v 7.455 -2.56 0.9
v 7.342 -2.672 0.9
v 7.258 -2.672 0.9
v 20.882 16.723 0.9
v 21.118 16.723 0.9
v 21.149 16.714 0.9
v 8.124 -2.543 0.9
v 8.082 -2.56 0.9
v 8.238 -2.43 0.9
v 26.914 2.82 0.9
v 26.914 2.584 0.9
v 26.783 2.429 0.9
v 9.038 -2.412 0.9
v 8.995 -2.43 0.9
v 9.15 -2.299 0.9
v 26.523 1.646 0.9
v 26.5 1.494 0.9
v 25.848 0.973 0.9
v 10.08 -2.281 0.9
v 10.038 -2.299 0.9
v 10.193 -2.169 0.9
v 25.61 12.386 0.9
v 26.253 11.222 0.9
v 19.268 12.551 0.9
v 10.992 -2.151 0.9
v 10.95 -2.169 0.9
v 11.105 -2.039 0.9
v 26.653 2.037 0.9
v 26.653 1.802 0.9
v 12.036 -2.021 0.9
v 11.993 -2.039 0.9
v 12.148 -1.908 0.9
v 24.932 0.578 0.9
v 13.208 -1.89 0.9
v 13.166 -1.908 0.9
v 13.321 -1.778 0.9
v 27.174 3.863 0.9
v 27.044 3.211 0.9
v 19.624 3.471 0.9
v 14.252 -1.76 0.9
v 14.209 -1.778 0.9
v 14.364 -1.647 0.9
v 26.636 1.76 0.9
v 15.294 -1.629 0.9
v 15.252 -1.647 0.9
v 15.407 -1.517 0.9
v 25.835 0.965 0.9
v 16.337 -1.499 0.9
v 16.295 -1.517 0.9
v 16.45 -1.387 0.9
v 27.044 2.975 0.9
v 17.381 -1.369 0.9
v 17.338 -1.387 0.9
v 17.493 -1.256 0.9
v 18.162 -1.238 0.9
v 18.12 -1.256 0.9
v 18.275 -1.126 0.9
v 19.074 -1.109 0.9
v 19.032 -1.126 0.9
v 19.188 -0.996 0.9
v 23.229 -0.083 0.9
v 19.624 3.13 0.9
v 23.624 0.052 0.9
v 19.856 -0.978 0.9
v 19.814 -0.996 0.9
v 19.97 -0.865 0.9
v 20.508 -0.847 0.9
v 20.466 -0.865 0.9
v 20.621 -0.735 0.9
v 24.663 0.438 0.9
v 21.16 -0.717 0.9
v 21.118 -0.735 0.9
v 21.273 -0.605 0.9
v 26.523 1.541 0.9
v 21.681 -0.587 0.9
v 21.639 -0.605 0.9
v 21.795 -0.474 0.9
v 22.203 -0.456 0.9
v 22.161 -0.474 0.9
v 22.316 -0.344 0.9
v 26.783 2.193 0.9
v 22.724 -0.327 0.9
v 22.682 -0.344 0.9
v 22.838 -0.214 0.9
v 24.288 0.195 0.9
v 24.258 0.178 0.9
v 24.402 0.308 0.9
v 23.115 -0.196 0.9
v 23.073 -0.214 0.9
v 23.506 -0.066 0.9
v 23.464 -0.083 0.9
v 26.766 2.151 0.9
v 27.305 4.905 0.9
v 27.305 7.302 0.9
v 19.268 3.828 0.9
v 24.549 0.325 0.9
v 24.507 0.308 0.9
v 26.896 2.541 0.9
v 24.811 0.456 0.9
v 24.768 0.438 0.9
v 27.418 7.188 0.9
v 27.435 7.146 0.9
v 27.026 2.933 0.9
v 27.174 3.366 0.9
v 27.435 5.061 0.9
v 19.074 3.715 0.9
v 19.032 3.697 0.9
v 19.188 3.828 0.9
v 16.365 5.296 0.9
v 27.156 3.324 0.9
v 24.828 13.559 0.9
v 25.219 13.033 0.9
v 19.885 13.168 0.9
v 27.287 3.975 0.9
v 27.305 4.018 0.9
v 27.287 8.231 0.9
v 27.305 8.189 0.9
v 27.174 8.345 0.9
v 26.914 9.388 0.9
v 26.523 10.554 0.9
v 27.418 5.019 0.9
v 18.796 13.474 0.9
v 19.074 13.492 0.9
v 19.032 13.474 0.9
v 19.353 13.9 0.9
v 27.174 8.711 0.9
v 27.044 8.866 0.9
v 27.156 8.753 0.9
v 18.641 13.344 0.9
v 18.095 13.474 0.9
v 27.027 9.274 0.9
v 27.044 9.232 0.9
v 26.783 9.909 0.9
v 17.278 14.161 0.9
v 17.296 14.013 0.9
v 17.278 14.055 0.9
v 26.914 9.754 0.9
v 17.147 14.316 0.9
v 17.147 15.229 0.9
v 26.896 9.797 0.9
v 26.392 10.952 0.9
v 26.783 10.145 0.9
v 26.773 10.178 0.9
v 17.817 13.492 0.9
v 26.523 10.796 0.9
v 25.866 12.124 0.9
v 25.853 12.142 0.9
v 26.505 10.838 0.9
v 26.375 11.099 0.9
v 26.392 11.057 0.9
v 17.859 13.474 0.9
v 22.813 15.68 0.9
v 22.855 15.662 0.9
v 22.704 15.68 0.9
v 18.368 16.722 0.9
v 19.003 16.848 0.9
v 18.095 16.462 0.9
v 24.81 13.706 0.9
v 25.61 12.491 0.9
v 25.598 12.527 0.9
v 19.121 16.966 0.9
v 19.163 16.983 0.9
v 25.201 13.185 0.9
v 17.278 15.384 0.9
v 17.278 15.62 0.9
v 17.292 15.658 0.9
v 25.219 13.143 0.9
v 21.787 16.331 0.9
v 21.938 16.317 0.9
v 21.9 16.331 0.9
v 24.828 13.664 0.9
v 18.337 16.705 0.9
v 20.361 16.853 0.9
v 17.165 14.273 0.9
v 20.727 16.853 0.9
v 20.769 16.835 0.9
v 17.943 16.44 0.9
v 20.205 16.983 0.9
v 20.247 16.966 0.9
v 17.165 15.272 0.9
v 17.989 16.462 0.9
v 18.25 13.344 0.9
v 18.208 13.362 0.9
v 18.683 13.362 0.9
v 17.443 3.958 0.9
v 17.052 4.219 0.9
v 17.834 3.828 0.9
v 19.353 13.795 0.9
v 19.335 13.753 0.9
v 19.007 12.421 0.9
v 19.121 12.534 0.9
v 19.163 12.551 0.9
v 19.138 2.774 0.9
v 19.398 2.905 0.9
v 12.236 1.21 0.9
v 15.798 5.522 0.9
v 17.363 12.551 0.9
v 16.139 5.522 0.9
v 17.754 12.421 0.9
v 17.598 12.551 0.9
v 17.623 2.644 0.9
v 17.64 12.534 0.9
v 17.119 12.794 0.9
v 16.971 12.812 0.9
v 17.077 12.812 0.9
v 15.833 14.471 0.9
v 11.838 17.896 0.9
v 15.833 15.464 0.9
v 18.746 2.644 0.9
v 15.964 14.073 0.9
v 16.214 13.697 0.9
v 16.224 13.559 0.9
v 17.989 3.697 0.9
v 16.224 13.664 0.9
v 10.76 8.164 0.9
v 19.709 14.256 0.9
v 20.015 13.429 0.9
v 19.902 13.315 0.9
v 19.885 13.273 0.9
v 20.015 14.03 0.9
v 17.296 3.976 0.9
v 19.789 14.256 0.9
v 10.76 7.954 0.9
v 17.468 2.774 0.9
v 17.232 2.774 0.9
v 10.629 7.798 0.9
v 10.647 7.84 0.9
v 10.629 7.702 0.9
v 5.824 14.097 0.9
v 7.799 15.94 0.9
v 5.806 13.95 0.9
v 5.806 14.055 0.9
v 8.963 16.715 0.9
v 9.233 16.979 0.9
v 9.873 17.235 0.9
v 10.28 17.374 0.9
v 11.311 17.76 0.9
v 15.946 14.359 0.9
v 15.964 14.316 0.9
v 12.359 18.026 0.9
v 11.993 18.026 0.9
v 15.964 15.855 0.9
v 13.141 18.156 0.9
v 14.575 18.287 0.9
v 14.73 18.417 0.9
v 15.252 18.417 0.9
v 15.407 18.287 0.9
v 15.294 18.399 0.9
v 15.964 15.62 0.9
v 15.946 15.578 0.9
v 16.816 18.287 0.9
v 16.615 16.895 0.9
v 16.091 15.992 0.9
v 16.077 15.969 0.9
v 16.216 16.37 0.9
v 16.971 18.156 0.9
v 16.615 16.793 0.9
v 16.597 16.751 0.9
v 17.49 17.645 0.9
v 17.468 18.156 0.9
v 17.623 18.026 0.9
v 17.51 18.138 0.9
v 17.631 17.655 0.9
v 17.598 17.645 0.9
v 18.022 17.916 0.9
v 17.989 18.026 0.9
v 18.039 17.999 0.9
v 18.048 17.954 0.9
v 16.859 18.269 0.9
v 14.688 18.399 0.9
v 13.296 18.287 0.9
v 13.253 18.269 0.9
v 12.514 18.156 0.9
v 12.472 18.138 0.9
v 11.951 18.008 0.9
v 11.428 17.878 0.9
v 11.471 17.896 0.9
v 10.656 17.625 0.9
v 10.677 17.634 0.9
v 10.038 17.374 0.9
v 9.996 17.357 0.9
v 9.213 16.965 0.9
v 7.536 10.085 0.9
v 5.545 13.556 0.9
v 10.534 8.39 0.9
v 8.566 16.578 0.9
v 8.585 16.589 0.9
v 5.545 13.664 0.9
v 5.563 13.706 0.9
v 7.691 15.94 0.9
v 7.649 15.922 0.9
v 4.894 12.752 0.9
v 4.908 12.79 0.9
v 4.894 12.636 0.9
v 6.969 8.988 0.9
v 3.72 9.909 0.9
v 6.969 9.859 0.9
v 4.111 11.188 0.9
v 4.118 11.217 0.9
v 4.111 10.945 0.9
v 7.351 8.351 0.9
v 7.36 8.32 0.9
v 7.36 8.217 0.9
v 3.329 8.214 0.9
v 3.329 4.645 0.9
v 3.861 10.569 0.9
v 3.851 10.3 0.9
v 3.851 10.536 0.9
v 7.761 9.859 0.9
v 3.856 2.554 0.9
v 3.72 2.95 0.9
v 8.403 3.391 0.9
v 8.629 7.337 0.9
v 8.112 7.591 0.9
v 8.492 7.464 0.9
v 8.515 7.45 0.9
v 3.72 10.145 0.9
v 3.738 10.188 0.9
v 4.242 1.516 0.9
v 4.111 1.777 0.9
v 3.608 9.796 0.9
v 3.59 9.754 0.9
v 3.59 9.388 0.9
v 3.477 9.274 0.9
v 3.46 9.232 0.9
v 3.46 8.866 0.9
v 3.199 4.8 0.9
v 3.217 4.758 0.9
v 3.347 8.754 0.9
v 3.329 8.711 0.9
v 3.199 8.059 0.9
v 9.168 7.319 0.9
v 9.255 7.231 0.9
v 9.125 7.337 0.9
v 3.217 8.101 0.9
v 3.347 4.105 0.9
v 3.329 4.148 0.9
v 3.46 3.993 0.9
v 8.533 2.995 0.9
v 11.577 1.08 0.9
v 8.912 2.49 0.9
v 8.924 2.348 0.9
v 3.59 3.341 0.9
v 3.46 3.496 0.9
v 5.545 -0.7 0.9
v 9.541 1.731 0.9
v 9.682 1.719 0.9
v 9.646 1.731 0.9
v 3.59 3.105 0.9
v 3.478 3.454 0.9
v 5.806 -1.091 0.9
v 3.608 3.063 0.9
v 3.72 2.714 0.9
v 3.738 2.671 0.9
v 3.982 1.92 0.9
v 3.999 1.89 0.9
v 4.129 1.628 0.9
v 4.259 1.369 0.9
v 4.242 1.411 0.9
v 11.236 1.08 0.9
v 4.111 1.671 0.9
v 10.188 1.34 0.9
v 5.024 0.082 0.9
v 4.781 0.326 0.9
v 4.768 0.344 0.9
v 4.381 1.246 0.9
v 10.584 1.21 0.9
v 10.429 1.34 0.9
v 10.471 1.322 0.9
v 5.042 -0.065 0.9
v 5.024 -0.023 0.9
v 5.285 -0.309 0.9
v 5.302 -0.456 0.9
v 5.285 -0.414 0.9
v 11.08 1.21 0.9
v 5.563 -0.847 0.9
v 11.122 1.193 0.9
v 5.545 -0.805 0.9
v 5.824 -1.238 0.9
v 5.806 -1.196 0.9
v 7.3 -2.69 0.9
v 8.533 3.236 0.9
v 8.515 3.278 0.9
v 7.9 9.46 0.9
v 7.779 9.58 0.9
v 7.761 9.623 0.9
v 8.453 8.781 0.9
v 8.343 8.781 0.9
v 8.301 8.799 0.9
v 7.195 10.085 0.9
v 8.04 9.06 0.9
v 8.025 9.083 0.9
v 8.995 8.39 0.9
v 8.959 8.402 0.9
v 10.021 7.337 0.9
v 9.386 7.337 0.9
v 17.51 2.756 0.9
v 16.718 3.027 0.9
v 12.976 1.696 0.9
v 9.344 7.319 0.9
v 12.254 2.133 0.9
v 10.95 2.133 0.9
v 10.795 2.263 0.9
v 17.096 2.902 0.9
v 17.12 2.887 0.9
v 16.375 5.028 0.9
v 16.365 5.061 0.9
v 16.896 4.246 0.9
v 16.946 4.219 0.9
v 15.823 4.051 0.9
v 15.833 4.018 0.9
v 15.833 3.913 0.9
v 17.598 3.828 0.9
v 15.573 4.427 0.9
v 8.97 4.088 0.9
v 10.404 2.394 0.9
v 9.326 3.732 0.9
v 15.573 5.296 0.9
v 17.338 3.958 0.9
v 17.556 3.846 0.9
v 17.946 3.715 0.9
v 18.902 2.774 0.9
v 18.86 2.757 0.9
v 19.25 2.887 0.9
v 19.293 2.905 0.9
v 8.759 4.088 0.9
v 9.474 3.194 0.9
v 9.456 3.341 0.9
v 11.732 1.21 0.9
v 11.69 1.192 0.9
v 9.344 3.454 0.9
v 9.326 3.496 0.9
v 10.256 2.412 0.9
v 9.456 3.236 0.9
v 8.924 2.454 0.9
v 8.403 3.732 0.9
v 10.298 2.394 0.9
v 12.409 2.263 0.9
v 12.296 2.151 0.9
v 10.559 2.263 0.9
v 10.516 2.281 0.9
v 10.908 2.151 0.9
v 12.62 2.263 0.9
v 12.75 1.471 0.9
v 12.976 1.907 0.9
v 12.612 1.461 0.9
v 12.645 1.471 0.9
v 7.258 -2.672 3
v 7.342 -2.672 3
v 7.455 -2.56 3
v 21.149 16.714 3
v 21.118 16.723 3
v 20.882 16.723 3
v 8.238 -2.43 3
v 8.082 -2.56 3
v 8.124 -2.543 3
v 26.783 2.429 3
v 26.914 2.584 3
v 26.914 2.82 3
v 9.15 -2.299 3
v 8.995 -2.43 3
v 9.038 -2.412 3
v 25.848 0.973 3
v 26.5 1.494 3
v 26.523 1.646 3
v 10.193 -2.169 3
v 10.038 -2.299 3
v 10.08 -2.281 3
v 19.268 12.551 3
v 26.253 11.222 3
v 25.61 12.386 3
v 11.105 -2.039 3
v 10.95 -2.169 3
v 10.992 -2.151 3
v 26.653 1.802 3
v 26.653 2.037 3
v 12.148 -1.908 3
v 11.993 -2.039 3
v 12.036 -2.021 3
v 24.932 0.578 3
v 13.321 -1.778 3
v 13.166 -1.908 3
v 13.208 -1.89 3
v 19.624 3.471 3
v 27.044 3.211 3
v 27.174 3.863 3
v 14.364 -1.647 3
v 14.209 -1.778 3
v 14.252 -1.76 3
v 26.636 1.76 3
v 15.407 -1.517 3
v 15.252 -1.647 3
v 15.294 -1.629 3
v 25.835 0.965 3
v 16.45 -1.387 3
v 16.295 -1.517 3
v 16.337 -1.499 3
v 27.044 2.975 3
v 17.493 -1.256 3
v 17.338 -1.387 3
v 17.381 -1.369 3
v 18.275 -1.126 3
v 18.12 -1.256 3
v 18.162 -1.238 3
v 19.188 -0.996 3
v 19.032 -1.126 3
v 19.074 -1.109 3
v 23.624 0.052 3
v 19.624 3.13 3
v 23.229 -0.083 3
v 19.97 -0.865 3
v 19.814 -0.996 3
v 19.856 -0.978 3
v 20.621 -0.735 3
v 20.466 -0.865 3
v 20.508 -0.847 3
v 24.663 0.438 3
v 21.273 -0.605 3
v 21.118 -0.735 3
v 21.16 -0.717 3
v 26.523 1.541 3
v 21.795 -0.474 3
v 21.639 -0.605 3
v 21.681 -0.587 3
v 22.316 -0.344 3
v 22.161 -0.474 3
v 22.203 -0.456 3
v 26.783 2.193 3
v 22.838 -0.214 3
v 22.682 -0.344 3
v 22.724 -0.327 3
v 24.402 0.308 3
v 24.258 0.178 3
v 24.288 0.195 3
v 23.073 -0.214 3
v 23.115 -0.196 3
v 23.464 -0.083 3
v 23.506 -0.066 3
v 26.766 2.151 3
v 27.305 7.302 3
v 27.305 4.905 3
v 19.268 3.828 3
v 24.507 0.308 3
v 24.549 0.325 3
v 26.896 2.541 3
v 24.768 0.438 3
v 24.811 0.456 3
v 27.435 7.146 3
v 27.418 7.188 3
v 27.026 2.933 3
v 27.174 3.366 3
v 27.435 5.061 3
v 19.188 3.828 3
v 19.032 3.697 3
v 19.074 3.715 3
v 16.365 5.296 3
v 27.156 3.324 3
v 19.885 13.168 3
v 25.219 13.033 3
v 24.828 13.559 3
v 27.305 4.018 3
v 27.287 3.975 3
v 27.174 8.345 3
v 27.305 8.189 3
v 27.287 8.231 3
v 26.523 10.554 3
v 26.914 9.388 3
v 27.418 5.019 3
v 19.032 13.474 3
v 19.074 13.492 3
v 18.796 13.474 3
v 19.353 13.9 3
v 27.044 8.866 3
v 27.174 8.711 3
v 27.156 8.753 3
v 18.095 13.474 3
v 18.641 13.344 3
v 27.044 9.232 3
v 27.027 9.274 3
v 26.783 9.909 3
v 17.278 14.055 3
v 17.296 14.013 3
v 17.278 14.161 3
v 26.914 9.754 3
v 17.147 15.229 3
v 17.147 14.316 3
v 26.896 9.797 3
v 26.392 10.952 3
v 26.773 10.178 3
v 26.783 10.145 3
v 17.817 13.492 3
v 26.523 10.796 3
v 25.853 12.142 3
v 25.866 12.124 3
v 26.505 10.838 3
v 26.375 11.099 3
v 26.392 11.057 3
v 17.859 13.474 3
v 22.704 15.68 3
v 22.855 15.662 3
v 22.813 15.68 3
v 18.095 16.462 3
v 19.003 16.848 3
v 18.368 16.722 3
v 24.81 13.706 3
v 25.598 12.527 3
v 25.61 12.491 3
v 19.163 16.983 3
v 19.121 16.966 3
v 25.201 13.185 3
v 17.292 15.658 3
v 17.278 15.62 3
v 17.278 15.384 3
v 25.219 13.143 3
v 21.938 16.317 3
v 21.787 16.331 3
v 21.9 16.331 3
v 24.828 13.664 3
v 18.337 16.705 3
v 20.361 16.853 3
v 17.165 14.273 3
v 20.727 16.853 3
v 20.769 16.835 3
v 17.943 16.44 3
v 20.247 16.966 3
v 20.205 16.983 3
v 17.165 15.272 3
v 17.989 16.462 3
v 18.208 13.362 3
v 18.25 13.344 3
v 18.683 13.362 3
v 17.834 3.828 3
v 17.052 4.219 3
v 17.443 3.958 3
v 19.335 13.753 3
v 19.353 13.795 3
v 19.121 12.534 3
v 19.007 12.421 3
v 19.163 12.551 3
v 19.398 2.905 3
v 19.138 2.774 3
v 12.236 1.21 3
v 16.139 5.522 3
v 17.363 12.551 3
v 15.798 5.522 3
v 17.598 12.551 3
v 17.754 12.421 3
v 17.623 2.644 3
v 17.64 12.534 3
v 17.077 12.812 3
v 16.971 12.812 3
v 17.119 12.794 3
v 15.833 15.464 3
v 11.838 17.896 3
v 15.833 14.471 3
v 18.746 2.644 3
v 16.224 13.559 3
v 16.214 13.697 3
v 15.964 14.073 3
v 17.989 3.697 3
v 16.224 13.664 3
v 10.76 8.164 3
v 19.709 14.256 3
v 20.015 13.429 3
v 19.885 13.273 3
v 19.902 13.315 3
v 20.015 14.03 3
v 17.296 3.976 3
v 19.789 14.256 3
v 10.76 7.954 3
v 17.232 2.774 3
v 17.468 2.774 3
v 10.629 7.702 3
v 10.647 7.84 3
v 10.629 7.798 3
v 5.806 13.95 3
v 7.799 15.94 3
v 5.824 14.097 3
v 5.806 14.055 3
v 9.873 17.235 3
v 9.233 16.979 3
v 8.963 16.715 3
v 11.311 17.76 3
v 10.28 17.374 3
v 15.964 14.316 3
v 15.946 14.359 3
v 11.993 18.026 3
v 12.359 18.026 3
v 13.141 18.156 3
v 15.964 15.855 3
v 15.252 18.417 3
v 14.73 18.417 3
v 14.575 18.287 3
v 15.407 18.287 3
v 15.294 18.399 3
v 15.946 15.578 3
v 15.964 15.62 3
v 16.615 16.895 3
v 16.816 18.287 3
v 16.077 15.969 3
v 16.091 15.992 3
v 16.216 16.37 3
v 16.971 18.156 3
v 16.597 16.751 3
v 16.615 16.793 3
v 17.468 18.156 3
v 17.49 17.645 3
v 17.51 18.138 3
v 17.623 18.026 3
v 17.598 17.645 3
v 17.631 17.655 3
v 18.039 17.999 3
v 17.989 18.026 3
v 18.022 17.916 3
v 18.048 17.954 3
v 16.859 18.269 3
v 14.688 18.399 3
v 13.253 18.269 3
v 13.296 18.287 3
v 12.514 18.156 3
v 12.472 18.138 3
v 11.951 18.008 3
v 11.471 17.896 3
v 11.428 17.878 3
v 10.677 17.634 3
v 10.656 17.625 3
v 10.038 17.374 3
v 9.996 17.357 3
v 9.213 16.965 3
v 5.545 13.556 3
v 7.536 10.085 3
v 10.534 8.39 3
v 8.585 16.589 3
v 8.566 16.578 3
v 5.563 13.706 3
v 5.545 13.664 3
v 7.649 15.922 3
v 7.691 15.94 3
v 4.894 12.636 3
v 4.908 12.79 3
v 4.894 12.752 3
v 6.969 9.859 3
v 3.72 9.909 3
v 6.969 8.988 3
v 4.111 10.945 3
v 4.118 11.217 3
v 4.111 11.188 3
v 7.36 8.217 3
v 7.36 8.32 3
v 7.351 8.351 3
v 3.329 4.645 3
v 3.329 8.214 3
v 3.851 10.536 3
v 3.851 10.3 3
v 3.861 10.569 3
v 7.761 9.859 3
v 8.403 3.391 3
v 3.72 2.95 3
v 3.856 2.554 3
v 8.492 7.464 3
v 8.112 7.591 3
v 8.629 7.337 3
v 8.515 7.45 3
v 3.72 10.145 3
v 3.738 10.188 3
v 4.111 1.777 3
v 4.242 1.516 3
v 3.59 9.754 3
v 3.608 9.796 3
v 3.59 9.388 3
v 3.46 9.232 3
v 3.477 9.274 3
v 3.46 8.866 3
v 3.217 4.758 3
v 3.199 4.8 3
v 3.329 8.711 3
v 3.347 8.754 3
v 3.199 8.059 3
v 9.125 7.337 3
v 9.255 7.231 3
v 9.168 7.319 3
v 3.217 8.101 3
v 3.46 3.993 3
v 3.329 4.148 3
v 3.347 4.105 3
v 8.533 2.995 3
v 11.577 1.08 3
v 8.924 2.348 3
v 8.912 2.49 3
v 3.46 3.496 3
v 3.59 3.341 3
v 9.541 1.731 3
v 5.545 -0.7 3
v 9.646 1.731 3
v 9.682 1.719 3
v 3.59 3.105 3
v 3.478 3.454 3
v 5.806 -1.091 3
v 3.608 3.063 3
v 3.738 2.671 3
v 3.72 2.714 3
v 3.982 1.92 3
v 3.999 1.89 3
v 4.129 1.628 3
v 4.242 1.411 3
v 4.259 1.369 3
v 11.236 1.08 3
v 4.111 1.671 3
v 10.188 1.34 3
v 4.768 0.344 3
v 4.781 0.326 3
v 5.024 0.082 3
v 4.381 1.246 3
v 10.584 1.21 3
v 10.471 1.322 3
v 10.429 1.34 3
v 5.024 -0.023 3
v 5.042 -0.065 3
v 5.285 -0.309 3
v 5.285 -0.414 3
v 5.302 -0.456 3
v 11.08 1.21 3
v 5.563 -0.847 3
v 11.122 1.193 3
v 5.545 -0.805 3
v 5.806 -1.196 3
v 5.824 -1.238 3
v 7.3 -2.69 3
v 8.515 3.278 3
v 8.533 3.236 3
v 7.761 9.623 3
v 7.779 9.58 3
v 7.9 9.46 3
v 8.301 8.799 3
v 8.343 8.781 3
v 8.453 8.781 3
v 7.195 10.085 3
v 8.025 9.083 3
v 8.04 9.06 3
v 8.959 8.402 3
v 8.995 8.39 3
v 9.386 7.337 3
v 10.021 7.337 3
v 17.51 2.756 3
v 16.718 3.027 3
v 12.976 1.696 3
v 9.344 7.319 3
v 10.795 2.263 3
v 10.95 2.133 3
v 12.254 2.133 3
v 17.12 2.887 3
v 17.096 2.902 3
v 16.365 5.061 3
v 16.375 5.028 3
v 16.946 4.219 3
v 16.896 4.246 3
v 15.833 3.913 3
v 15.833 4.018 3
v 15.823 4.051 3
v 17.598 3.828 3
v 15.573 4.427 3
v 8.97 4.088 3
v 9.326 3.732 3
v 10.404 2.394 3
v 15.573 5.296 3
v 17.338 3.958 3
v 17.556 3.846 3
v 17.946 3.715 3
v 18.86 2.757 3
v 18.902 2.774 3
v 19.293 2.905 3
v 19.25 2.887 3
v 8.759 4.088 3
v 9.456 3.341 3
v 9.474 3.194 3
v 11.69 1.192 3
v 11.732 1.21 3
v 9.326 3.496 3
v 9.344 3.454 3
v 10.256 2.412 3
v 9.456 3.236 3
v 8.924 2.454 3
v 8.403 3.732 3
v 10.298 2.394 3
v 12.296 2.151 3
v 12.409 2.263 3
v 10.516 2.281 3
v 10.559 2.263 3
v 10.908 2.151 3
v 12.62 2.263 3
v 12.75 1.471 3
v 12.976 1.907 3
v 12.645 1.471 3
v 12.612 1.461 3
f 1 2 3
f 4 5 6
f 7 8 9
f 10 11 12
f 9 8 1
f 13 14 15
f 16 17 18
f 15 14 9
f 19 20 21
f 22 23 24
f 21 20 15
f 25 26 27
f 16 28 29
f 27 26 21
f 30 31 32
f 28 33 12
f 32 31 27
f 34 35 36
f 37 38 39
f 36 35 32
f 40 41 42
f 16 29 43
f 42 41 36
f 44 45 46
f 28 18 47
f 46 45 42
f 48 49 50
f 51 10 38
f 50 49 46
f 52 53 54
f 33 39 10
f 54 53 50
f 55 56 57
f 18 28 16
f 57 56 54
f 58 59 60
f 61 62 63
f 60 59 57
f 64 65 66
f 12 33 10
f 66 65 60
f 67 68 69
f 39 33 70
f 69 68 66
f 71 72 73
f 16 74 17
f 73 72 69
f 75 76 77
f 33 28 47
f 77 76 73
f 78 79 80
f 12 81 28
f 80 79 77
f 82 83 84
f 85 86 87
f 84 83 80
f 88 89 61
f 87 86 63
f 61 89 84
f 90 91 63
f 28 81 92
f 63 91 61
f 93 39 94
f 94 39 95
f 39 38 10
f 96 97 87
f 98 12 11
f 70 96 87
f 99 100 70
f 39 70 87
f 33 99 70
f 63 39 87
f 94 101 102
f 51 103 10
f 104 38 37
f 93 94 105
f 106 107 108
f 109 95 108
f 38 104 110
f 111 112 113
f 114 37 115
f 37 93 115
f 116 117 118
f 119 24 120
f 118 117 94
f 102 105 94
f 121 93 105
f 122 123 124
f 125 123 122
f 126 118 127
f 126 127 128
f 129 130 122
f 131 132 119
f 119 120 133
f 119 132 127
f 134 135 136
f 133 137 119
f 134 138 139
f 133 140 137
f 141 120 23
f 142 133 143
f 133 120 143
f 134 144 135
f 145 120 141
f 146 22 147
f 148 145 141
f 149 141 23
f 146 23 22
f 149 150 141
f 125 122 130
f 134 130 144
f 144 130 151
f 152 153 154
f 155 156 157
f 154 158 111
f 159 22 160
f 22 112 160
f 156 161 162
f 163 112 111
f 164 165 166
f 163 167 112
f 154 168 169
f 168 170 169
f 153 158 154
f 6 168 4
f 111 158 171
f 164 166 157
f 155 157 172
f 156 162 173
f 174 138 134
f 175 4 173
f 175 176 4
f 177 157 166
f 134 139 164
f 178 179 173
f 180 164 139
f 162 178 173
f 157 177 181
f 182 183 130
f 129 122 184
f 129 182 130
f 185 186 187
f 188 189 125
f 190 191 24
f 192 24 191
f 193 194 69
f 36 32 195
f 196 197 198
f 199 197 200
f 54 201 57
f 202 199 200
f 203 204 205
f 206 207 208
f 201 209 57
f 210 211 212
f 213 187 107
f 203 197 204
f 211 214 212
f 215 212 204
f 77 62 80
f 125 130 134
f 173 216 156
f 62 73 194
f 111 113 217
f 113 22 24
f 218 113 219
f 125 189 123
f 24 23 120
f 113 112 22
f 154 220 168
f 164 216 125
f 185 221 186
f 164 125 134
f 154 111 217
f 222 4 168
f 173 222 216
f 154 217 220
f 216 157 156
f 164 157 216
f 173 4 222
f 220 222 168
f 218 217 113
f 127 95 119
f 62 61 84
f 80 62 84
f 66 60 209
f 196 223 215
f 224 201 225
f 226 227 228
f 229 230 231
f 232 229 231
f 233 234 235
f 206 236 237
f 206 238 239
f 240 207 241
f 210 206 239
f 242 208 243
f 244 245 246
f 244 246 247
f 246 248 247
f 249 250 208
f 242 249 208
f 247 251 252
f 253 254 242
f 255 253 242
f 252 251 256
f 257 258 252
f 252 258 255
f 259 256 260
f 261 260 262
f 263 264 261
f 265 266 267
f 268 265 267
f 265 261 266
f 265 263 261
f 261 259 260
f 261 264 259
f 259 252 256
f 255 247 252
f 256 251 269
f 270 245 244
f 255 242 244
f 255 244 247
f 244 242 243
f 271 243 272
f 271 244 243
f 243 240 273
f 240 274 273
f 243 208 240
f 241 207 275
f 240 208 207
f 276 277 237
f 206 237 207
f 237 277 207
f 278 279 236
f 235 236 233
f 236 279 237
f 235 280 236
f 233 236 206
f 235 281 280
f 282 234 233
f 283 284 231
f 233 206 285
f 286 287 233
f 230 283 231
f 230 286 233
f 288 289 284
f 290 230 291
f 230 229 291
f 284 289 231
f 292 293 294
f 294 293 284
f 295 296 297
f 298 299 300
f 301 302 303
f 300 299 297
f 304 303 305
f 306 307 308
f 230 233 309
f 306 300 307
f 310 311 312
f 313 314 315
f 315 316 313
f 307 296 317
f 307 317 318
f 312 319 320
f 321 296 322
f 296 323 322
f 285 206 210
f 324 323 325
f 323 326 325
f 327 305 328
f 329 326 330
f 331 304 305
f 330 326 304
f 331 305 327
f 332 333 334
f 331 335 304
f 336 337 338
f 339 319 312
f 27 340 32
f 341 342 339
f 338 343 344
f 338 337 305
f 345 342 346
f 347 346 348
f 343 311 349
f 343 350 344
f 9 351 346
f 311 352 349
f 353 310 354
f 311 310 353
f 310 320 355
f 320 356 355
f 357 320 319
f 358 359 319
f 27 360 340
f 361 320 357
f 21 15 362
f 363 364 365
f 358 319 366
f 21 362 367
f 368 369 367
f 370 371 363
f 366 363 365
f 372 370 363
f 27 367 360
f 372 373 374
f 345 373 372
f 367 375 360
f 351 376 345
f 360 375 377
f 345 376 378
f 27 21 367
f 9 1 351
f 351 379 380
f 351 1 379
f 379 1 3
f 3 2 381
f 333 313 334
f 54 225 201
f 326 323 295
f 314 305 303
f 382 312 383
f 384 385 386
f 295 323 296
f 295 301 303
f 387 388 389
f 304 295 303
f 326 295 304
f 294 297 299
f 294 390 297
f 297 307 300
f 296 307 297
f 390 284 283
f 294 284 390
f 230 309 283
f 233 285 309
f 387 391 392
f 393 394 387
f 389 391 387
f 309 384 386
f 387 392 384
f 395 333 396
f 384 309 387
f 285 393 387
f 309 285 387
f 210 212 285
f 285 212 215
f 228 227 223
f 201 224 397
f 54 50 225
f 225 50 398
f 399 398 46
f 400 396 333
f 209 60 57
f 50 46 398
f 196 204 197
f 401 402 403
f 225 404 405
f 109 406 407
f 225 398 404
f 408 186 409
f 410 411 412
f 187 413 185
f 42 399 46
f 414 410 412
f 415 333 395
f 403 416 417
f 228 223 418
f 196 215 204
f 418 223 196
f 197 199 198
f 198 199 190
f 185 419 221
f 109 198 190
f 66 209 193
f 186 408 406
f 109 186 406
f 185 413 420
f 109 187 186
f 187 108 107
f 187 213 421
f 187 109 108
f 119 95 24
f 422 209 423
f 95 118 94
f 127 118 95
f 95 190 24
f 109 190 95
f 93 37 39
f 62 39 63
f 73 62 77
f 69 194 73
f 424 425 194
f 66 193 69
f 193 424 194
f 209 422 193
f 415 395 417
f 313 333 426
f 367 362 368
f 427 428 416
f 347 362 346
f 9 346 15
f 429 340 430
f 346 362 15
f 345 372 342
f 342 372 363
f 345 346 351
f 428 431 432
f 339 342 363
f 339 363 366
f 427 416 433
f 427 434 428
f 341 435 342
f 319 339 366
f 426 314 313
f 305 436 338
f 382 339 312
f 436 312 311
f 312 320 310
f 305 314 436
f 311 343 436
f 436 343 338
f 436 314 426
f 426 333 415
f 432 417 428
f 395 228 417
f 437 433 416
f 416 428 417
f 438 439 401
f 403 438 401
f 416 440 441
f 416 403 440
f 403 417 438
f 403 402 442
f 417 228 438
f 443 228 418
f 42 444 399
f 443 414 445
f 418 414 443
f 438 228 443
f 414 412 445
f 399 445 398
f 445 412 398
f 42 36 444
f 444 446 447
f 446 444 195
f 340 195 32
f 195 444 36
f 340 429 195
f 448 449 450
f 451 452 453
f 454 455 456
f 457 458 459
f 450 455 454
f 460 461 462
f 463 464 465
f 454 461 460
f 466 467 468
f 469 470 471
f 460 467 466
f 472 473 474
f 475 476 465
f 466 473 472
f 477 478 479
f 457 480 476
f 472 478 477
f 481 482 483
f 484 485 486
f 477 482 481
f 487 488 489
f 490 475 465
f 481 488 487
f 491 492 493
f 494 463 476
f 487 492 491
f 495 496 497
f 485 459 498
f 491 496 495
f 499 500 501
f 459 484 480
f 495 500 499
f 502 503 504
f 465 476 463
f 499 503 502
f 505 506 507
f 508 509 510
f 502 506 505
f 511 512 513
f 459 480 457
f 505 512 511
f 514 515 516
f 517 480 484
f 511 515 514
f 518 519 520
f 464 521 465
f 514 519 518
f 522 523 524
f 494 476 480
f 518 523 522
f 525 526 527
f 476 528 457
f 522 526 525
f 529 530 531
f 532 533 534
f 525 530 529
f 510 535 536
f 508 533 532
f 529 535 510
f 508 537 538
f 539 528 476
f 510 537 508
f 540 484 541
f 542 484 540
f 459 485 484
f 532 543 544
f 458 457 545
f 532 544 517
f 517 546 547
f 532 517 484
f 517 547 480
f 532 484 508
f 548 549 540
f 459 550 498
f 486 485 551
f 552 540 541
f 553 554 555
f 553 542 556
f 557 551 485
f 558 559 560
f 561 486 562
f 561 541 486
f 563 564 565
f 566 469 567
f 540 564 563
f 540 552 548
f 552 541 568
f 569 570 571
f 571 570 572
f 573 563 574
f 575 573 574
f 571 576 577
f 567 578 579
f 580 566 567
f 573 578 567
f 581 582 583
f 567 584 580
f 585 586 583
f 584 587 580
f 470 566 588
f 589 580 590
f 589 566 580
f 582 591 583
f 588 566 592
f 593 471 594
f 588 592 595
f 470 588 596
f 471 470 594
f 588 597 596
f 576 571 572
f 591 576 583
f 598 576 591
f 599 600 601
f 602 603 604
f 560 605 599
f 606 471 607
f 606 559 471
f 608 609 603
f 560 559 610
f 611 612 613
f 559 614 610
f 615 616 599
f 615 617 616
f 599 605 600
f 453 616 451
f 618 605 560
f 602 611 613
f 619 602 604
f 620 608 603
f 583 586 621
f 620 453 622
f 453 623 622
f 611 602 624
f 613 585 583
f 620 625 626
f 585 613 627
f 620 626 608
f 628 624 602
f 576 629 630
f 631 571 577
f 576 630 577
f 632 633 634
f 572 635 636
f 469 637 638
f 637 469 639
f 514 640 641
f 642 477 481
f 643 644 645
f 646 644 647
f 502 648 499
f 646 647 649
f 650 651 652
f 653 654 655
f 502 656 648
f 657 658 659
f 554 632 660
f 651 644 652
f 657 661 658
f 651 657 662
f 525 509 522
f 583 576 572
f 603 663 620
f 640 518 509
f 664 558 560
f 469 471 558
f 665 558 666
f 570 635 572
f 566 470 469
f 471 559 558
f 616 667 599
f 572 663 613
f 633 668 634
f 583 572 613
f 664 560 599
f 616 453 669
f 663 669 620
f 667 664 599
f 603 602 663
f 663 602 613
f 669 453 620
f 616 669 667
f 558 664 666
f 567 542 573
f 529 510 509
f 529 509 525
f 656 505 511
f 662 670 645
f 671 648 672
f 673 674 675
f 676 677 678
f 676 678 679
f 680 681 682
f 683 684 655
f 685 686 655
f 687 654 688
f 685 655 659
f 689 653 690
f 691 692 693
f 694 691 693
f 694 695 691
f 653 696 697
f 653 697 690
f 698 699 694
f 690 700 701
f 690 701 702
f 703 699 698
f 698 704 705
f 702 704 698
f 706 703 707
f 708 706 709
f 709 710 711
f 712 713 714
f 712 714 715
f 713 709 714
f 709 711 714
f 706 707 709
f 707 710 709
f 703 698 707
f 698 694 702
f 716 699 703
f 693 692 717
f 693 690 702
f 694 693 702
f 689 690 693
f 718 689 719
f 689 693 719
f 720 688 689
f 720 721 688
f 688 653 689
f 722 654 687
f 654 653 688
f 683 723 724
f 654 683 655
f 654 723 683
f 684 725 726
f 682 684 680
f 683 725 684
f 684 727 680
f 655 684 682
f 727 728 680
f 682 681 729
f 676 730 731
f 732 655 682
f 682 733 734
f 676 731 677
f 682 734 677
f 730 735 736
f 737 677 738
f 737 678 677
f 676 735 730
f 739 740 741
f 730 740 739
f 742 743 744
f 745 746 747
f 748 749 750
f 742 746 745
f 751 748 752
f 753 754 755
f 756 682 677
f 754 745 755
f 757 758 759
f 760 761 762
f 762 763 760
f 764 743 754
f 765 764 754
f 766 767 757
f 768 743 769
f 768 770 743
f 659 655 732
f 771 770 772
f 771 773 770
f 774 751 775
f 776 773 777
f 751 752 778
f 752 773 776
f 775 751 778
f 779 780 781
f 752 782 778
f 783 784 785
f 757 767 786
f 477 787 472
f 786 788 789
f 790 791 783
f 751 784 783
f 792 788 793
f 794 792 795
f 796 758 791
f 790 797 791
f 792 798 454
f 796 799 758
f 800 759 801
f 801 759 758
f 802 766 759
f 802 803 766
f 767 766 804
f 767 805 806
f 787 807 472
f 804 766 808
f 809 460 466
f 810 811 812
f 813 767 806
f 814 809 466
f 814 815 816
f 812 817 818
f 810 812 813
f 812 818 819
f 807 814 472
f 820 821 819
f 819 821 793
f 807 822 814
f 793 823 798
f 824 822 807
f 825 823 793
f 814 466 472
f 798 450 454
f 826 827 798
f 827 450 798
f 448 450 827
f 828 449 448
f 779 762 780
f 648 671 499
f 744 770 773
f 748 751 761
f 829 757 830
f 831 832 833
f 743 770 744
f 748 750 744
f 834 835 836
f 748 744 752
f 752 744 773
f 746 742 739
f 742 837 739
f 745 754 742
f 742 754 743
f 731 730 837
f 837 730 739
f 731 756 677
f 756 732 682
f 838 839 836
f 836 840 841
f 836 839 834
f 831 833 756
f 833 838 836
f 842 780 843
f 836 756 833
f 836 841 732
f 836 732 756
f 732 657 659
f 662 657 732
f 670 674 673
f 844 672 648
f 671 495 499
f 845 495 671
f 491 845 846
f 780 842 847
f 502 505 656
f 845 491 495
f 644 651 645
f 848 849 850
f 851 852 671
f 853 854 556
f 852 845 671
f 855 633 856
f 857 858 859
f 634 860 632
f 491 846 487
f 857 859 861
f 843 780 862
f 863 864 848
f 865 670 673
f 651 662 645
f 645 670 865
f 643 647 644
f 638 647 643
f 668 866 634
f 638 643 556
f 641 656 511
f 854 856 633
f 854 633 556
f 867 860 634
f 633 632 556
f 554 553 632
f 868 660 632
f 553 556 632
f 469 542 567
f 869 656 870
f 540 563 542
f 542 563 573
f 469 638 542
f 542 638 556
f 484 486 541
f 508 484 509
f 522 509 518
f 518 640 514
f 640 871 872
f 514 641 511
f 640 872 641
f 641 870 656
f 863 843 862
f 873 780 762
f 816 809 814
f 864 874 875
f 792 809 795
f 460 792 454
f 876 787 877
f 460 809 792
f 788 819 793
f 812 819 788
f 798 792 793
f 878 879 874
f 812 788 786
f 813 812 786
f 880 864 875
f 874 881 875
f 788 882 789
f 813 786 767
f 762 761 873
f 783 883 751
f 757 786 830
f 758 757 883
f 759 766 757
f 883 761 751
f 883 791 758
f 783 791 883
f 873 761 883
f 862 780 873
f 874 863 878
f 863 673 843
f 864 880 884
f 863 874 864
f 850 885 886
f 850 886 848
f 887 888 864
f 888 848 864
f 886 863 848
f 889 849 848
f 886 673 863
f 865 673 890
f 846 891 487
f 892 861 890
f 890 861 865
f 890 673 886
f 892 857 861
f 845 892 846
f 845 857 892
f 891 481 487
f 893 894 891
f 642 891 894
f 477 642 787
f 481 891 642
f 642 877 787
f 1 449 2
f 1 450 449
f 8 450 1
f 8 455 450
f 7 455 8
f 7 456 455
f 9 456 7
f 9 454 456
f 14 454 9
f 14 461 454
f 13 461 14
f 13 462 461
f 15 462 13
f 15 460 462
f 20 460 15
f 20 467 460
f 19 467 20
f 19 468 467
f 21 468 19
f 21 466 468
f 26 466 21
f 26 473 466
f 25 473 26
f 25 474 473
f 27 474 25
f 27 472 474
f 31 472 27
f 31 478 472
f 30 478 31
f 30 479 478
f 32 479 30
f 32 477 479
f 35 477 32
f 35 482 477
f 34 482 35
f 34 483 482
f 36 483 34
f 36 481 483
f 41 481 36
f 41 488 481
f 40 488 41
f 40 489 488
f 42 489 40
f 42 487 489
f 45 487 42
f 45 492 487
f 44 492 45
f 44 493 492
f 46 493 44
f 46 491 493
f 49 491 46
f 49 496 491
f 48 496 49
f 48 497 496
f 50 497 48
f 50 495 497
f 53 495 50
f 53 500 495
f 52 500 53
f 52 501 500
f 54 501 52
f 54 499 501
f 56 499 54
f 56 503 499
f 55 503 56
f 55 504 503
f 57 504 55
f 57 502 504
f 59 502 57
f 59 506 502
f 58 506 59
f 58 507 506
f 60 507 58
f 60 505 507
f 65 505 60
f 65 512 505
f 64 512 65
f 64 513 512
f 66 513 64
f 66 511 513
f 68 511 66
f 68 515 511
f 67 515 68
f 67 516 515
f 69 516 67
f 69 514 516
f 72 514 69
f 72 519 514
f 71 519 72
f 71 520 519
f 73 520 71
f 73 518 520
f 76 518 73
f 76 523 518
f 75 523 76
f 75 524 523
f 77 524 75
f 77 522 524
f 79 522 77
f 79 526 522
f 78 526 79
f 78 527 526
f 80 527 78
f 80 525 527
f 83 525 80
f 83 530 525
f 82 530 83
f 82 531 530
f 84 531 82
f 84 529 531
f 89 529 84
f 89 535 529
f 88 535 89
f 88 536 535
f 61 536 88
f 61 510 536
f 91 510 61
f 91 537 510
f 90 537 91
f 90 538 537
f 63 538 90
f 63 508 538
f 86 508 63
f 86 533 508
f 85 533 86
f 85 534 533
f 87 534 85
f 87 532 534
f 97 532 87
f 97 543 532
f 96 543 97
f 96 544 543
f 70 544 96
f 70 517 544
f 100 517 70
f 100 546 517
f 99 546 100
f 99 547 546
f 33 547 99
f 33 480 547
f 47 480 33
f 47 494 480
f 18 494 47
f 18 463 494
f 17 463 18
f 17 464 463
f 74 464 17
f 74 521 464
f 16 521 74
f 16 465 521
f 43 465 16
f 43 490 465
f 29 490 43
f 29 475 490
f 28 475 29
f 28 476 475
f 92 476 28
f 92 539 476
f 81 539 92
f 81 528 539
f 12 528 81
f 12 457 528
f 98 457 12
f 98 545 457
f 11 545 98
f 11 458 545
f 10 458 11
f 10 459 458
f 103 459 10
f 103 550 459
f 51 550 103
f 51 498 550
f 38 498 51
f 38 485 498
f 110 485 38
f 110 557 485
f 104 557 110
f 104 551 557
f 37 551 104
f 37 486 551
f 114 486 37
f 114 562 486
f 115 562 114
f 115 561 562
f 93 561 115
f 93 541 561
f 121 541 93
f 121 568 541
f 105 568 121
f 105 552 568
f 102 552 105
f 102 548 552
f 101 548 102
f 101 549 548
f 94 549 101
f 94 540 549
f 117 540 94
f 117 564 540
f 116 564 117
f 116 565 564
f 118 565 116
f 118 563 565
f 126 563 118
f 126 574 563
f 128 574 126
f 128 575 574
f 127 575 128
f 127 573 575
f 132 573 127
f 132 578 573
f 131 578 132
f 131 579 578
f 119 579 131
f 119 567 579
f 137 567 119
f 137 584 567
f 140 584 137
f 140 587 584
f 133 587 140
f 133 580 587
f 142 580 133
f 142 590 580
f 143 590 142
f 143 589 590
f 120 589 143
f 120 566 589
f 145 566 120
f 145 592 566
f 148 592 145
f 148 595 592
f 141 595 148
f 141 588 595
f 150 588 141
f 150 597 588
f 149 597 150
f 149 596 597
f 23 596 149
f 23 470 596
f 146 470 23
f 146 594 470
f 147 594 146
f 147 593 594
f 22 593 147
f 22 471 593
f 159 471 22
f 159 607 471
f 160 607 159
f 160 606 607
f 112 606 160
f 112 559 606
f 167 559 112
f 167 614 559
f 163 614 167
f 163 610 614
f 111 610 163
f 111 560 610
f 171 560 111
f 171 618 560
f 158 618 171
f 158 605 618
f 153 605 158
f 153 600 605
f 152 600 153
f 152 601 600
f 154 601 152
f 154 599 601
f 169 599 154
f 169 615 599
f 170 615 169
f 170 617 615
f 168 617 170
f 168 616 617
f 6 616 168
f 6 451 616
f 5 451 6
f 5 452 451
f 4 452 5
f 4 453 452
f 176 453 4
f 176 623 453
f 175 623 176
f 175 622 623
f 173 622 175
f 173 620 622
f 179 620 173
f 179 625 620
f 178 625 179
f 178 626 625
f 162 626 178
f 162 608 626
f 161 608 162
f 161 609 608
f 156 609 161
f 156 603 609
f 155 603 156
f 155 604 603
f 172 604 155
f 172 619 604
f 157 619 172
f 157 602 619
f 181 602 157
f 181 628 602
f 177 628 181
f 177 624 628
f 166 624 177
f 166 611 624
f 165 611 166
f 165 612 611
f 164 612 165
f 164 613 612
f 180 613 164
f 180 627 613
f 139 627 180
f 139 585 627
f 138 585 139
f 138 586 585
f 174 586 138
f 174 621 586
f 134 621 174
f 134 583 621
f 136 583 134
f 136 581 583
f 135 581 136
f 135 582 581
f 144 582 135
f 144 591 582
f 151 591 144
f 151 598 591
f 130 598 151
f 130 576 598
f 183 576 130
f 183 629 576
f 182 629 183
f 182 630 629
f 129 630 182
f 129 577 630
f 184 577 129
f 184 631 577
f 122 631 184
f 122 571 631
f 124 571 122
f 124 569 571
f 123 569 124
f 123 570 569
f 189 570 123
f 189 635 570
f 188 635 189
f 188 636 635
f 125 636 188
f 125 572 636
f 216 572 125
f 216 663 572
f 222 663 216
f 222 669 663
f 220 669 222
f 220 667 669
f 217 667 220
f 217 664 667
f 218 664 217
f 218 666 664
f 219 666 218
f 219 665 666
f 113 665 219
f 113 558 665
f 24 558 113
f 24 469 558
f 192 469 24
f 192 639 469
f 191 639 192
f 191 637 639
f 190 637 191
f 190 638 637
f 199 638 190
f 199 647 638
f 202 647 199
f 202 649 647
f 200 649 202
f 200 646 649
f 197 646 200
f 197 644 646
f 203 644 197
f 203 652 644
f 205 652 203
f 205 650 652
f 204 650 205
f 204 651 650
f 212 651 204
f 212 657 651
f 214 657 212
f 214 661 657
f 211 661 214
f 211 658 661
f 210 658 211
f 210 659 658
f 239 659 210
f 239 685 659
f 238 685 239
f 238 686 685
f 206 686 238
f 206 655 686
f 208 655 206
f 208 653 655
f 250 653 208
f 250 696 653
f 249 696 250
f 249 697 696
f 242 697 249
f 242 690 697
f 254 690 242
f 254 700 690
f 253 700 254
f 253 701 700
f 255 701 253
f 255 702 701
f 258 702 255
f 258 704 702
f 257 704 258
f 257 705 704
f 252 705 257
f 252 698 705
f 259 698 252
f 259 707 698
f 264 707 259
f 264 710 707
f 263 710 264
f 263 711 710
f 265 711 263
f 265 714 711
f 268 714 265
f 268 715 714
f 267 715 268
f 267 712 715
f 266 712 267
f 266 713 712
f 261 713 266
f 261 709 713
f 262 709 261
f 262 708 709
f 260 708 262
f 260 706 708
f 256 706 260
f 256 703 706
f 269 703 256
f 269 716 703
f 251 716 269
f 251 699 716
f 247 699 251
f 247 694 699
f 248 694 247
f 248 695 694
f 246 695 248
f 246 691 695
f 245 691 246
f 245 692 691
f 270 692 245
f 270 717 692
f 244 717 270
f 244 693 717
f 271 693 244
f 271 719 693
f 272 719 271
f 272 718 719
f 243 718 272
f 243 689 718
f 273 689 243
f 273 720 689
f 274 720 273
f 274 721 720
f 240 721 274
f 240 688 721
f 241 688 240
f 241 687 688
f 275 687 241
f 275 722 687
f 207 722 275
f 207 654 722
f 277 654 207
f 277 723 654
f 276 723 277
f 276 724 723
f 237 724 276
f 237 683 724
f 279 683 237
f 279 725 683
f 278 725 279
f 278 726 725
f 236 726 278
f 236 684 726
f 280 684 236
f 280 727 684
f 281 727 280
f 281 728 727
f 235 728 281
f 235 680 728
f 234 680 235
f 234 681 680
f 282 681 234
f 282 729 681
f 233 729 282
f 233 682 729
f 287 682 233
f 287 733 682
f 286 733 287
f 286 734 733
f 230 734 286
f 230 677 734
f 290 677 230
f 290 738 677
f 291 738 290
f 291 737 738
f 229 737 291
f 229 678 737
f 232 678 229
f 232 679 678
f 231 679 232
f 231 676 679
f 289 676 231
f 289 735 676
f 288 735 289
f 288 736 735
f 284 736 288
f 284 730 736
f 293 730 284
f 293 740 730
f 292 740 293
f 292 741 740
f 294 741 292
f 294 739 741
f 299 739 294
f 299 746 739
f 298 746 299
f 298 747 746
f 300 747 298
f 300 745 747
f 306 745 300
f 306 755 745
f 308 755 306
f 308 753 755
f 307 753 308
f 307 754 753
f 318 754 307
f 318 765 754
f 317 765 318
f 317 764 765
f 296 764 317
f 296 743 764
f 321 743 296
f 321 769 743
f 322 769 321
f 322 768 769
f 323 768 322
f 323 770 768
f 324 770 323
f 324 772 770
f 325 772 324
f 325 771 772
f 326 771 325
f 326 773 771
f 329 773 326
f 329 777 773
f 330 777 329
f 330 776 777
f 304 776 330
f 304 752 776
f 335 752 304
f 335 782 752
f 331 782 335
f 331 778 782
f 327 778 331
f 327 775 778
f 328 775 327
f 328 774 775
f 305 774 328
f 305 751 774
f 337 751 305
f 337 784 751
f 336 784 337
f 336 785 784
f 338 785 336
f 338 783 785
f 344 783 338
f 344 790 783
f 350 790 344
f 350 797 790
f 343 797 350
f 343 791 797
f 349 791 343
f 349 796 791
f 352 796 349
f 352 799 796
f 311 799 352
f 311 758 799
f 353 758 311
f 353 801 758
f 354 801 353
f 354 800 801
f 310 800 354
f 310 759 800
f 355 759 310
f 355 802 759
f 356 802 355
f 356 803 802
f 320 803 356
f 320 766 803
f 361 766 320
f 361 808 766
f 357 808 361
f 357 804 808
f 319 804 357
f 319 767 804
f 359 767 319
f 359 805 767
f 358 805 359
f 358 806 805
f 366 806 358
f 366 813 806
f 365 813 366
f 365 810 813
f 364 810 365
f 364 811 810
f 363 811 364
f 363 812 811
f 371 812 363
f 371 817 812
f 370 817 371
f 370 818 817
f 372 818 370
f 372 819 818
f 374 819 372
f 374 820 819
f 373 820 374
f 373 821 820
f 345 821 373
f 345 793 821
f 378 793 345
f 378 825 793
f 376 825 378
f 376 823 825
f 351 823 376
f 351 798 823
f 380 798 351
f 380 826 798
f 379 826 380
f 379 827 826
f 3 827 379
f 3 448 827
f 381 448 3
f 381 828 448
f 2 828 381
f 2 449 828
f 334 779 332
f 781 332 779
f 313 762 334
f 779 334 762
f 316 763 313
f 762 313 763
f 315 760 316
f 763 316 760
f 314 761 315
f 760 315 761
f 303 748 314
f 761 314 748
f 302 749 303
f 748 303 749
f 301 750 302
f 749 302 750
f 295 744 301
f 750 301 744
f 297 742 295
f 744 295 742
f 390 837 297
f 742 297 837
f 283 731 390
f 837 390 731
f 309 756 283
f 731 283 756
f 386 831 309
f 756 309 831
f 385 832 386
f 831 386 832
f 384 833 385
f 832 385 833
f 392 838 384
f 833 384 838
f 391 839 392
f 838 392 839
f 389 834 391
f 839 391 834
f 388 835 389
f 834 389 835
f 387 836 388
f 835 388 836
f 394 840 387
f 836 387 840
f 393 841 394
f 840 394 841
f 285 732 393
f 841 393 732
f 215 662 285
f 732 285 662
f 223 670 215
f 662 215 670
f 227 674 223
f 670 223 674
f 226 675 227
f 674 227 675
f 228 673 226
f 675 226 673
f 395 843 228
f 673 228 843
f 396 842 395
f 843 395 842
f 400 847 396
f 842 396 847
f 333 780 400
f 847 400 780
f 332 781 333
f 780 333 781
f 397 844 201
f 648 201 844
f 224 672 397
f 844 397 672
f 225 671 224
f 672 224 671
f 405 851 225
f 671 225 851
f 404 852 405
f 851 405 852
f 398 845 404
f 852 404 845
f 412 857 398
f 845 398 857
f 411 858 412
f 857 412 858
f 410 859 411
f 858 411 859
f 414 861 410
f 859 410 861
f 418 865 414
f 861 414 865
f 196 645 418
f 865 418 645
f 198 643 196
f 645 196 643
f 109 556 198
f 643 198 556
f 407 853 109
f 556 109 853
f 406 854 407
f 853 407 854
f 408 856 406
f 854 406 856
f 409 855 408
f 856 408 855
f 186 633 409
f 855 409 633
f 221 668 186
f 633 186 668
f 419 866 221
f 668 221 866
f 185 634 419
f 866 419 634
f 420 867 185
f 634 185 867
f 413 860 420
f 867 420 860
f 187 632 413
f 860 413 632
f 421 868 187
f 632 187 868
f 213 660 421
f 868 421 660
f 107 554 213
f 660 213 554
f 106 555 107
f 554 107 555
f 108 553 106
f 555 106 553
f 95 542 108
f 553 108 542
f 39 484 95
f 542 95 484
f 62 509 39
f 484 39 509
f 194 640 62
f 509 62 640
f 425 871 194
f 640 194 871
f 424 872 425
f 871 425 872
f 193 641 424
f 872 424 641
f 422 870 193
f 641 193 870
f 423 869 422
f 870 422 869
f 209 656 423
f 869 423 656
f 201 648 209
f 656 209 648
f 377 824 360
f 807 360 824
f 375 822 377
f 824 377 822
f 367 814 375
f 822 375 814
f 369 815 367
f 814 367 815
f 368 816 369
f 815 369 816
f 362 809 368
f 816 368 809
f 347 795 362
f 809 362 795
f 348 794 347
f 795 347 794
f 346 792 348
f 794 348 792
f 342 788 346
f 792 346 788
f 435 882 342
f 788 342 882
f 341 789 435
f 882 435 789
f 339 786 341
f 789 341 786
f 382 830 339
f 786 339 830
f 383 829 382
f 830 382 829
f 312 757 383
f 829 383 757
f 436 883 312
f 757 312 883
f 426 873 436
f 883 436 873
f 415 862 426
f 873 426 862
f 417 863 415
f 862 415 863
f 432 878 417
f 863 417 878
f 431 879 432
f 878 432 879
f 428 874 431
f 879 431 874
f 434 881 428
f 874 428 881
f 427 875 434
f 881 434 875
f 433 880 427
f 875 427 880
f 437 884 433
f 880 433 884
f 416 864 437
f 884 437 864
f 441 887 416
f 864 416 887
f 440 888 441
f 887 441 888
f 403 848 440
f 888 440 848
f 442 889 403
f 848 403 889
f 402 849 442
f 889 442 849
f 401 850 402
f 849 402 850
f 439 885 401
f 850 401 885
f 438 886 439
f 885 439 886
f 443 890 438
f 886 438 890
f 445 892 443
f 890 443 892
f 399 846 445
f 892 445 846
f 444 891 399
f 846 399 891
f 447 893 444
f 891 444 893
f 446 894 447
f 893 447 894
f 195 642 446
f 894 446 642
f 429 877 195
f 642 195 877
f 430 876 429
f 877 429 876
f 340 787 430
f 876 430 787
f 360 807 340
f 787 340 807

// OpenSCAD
$fn = 24;
translate([0, -2.500, 0.900])
  linear_extrude(height=2.100) {
offset(r=0.06, $fn=8) {
    polygon(points=[[22.813,18.120],[22.682,18.120],[21.900,18.771],[21.770,18.771],[21.118,19.163],[20.857,19.163],[20.727,19.293],[20.336,19.293],[20.205,19.423],[19.163,19.423],[19.032,19.293],[18.380,19.163],[18.120,18.902],[17.989,18.902],[17.338,18.120],[17.338,17.859],[17.207,17.729],[17.207,16.816],[17.338,16.686],[17.338,16.555],[17.859,16.034],[18.120,16.034],[18.250,15.904],[18.641,15.904],[18.771,16.034],[19.032,16.034],[19.293,16.295],[19.293,16.425],[19.684,16.816],[19.814,16.816],[20.075,16.555],[20.075,15.904],[19.945,15.773],[19.945,15.643],[19.293,14.991],[19.163,14.991],[19.032,14.861],[17.729,14.861],[17.598,14.991],[17.338,14.991],[17.077,15.252],[16.946,15.252],[16.164,16.034],[16.164,16.164],[15.904,16.555],[15.904,16.816],[15.773,16.946],[15.773,17.989],[15.904,18.120],[15.904,18.380],[16.034,18.511],[16.164,18.902],[16.555,19.293],[16.555,19.423],[17.468,20.205],[17.598,20.205],[17.989,20.466],[17.598,20.466],[17.468,20.596],[16.946,20.596],[16.816,20.727],[15.382,20.727],[15.252,20.857],[14.730,20.857],[14.600,20.727],[13.296,20.727],[13.166,20.596],[12.514,20.596],[12.384,20.466],[11.993,20.466],[11.863,20.336],[11.471,20.336],[11.341,20.205],[10.689,20.075],[10.298,19.814],[10.038,19.814],[9.907,19.684],[9.255,19.423],[8.995,19.163],[8.604,19.032],[7.821,18.380],[7.691,18.380],[5.866,16.555],[5.866,16.425],[5.605,16.164],[5.605,16.034],[4.954,15.252],[4.954,15.121],[4.171,13.688],[4.171,13.427],[3.911,13.036],[3.911,12.775],[3.780,12.645],[3.780,12.384],[3.650,12.254],[3.650,11.863],[3.520,11.732],[3.520,11.341],[3.389,11.211],[3.389,10.689],[3.259,10.559],[3.259,7.300],[3.389,7.170],[3.389,6.648],[3.520,6.518],[3.520,5.996],[3.650,5.866],[3.650,5.605],[3.780,5.475],[3.780,5.214],[3.911,5.084],[4.041,4.432],[4.171,4.302],[4.171,4.171],[4.302,4.041],[4.302,3.911],[4.432,3.780],[4.823,2.868],[5.084,2.607],[5.084,2.477],[5.345,2.216],[5.345,2.086],[5.605,1.825],[5.605,1.695],[5.866,1.434],[5.866,1.304],[7.300,-0.130],[7.430,0.000],[8.082,0.000],[8.213,0.130],[8.995,0.130],[9.125,0.261],[10.038,0.261],[10.168,0.391],[10.950,0.391],[11.080,0.521],[11.993,0.521],[12.123,0.652],[13.166,0.652],[13.296,0.782],[14.209,0.782],[14.339,0.913],[15.252,0.913],[15.382,1.043],[16.295,1.043],[16.425,1.173],[17.338,1.173],[17.468,1.304],[18.120,1.304],[18.250,1.434],[19.032,1.434],[19.163,1.564],[19.814,1.564],[19.945,1.695],[20.466,1.695],[20.596,1.825],[21.118,1.825],[21.248,1.955],[21.639,1.955],[21.770,2.086],[22.161,2.086],[22.291,2.216],[22.682,2.216],[22.813,2.346],[23.073,2.346],[23.204,2.477],[23.464,2.477],[23.595,2.607],[24.246,2.737],[24.377,2.868],[24.507,2.868],[24.638,2.998],[24.768,2.998],[24.898,3.129],[25.811,3.520],[26.463,4.041],[26.463,4.171],[26.593,4.302],[26.593,4.562],[26.723,4.693],[26.723,4.954],[26.854,5.084],[26.854,5.345],[26.984,5.475],[26.984,5.736],[27.114,5.866],[27.114,6.388],[27.245,6.518],[27.245,7.430],[27.375,7.561],[27.375,9.646],[27.245,9.777],[27.245,10.689],[27.114,10.820],[27.114,11.211],[26.984,11.341],[26.984,11.732],[26.854,11.863],[26.854,12.254],[26.723,12.384],[26.723,12.645],[26.463,13.036],[26.463,13.296],[26.332,13.427],[26.332,13.557],[26.202,13.688],[25.811,14.600],[25.550,14.861],[25.550,14.991],[25.159,15.513],[25.159,15.643],[24.768,16.034],[24.768,16.164],[8.343,6.257],[8.734,6.648],[8.995,6.648],[9.386,6.257],[9.386,5.996],[9.516,5.866],[9.516,5.736],[10.298,4.954],[10.429,4.954],[10.559,4.823],[10.820,4.823],[10.950,4.693],[12.254,4.693],[12.384,4.823],[12.645,4.823],[13.036,4.432],[13.036,4.171],[12.775,3.911],[12.645,3.911],[12.254,3.650],[11.732,3.650],[11.602,3.520],[11.211,3.520],[11.080,3.650],[10.559,3.650],[10.429,3.780],[10.168,3.780],[9.646,4.171],[9.516,4.171],[8.864,4.823],[8.864,4.954],[8.473,5.475],[8.473,5.736],[8.343,5.866],[15.513,7.821],[15.773,8.082],[16.164,8.082],[16.425,7.821],[16.425,7.561],[16.946,6.779],[17.077,6.779],[17.338,6.518],[17.468,6.518],[17.598,6.388],[17.859,6.388],[17.989,6.257],[19.032,6.257],[19.163,6.388],[19.293,6.388],[19.684,5.996],[19.684,5.605],[19.423,5.345],[19.293,5.345],[19.163,5.214],[18.902,5.214],[18.771,5.084],[17.598,5.084],[17.468,5.214],[17.207,5.214],[17.077,5.345],[16.686,5.475],[15.773,6.388],[15.773,6.518],[15.513,6.909],[6.909,12.384],[7.170,12.645],[7.561,12.645],[7.821,12.384],[7.821,12.123],[7.952,11.993],[8.082,11.602],[8.343,11.341],[8.473,11.341],[8.995,10.950],[10.559,10.950],[10.820,10.689],[10.820,10.429],[10.689,10.298],[10.689,10.168],[10.038,9.777],[9.386,9.777],[9.255,9.646],[9.125,9.777],[8.604,9.777],[8.473,9.907],[8.082,10.038],[7.300,10.689],[7.300,10.820],[6.909,11.471]], paths=[[0,1,2,3,4,5,6,7,8,9,10,11,12,13,14,15,16,17,18,19,20,21,22,23,24,25,26,27,28,29,30,31,32,33,34,35,36,37,38,39,40,41,42,43,44,45,46,47,48,49,50,51,52,53,54,55,56,57,58,59,60,61,62,63,64,65,66,67,68,69,70,71,72,73,74,75,76,77,78,79,80,81,82,83,84,85,86,87,88,89,90,91,92,93,94,95,96,97,98,99,100,101,102,103,104,105,106,107,108,109,110,111,112,113,114,115,116,117,118,119,120,121,122,123,124,125,126,127,128,129,130,131,132,133,134,135,136,137,138,139,140,141,142,143,144,145,146,147,148,149,150,151,152,153,154,155,156,157,158,159,160,161,162,163,164,165,166,167,168,169,170,171,172,173,174,175,176,177,178,179,180,181,182,183,184,185,186,187,188,189,190,191,192,193,194,195,196,197,198,199,200,201,202,203,204,205,206,207,208,209,210,211,212],[213,214,215,216,217,218,219,220,221,222,223,224,225,226,227,228,229,230,231,232,233,234,235,236,237,238,239,240,241,242,243,244,245,246],[247,248,249,250,251,252,253,254,255,256,257,258,259,260,261,262,263,264,265,266,267,268,269,270,271,272,273,274,275,276],[277,278,279,280,281,282,283,284,285,286,287,288,289,290,291,292,293,294,295,296,297,298,299,300,301]]);
}
}
